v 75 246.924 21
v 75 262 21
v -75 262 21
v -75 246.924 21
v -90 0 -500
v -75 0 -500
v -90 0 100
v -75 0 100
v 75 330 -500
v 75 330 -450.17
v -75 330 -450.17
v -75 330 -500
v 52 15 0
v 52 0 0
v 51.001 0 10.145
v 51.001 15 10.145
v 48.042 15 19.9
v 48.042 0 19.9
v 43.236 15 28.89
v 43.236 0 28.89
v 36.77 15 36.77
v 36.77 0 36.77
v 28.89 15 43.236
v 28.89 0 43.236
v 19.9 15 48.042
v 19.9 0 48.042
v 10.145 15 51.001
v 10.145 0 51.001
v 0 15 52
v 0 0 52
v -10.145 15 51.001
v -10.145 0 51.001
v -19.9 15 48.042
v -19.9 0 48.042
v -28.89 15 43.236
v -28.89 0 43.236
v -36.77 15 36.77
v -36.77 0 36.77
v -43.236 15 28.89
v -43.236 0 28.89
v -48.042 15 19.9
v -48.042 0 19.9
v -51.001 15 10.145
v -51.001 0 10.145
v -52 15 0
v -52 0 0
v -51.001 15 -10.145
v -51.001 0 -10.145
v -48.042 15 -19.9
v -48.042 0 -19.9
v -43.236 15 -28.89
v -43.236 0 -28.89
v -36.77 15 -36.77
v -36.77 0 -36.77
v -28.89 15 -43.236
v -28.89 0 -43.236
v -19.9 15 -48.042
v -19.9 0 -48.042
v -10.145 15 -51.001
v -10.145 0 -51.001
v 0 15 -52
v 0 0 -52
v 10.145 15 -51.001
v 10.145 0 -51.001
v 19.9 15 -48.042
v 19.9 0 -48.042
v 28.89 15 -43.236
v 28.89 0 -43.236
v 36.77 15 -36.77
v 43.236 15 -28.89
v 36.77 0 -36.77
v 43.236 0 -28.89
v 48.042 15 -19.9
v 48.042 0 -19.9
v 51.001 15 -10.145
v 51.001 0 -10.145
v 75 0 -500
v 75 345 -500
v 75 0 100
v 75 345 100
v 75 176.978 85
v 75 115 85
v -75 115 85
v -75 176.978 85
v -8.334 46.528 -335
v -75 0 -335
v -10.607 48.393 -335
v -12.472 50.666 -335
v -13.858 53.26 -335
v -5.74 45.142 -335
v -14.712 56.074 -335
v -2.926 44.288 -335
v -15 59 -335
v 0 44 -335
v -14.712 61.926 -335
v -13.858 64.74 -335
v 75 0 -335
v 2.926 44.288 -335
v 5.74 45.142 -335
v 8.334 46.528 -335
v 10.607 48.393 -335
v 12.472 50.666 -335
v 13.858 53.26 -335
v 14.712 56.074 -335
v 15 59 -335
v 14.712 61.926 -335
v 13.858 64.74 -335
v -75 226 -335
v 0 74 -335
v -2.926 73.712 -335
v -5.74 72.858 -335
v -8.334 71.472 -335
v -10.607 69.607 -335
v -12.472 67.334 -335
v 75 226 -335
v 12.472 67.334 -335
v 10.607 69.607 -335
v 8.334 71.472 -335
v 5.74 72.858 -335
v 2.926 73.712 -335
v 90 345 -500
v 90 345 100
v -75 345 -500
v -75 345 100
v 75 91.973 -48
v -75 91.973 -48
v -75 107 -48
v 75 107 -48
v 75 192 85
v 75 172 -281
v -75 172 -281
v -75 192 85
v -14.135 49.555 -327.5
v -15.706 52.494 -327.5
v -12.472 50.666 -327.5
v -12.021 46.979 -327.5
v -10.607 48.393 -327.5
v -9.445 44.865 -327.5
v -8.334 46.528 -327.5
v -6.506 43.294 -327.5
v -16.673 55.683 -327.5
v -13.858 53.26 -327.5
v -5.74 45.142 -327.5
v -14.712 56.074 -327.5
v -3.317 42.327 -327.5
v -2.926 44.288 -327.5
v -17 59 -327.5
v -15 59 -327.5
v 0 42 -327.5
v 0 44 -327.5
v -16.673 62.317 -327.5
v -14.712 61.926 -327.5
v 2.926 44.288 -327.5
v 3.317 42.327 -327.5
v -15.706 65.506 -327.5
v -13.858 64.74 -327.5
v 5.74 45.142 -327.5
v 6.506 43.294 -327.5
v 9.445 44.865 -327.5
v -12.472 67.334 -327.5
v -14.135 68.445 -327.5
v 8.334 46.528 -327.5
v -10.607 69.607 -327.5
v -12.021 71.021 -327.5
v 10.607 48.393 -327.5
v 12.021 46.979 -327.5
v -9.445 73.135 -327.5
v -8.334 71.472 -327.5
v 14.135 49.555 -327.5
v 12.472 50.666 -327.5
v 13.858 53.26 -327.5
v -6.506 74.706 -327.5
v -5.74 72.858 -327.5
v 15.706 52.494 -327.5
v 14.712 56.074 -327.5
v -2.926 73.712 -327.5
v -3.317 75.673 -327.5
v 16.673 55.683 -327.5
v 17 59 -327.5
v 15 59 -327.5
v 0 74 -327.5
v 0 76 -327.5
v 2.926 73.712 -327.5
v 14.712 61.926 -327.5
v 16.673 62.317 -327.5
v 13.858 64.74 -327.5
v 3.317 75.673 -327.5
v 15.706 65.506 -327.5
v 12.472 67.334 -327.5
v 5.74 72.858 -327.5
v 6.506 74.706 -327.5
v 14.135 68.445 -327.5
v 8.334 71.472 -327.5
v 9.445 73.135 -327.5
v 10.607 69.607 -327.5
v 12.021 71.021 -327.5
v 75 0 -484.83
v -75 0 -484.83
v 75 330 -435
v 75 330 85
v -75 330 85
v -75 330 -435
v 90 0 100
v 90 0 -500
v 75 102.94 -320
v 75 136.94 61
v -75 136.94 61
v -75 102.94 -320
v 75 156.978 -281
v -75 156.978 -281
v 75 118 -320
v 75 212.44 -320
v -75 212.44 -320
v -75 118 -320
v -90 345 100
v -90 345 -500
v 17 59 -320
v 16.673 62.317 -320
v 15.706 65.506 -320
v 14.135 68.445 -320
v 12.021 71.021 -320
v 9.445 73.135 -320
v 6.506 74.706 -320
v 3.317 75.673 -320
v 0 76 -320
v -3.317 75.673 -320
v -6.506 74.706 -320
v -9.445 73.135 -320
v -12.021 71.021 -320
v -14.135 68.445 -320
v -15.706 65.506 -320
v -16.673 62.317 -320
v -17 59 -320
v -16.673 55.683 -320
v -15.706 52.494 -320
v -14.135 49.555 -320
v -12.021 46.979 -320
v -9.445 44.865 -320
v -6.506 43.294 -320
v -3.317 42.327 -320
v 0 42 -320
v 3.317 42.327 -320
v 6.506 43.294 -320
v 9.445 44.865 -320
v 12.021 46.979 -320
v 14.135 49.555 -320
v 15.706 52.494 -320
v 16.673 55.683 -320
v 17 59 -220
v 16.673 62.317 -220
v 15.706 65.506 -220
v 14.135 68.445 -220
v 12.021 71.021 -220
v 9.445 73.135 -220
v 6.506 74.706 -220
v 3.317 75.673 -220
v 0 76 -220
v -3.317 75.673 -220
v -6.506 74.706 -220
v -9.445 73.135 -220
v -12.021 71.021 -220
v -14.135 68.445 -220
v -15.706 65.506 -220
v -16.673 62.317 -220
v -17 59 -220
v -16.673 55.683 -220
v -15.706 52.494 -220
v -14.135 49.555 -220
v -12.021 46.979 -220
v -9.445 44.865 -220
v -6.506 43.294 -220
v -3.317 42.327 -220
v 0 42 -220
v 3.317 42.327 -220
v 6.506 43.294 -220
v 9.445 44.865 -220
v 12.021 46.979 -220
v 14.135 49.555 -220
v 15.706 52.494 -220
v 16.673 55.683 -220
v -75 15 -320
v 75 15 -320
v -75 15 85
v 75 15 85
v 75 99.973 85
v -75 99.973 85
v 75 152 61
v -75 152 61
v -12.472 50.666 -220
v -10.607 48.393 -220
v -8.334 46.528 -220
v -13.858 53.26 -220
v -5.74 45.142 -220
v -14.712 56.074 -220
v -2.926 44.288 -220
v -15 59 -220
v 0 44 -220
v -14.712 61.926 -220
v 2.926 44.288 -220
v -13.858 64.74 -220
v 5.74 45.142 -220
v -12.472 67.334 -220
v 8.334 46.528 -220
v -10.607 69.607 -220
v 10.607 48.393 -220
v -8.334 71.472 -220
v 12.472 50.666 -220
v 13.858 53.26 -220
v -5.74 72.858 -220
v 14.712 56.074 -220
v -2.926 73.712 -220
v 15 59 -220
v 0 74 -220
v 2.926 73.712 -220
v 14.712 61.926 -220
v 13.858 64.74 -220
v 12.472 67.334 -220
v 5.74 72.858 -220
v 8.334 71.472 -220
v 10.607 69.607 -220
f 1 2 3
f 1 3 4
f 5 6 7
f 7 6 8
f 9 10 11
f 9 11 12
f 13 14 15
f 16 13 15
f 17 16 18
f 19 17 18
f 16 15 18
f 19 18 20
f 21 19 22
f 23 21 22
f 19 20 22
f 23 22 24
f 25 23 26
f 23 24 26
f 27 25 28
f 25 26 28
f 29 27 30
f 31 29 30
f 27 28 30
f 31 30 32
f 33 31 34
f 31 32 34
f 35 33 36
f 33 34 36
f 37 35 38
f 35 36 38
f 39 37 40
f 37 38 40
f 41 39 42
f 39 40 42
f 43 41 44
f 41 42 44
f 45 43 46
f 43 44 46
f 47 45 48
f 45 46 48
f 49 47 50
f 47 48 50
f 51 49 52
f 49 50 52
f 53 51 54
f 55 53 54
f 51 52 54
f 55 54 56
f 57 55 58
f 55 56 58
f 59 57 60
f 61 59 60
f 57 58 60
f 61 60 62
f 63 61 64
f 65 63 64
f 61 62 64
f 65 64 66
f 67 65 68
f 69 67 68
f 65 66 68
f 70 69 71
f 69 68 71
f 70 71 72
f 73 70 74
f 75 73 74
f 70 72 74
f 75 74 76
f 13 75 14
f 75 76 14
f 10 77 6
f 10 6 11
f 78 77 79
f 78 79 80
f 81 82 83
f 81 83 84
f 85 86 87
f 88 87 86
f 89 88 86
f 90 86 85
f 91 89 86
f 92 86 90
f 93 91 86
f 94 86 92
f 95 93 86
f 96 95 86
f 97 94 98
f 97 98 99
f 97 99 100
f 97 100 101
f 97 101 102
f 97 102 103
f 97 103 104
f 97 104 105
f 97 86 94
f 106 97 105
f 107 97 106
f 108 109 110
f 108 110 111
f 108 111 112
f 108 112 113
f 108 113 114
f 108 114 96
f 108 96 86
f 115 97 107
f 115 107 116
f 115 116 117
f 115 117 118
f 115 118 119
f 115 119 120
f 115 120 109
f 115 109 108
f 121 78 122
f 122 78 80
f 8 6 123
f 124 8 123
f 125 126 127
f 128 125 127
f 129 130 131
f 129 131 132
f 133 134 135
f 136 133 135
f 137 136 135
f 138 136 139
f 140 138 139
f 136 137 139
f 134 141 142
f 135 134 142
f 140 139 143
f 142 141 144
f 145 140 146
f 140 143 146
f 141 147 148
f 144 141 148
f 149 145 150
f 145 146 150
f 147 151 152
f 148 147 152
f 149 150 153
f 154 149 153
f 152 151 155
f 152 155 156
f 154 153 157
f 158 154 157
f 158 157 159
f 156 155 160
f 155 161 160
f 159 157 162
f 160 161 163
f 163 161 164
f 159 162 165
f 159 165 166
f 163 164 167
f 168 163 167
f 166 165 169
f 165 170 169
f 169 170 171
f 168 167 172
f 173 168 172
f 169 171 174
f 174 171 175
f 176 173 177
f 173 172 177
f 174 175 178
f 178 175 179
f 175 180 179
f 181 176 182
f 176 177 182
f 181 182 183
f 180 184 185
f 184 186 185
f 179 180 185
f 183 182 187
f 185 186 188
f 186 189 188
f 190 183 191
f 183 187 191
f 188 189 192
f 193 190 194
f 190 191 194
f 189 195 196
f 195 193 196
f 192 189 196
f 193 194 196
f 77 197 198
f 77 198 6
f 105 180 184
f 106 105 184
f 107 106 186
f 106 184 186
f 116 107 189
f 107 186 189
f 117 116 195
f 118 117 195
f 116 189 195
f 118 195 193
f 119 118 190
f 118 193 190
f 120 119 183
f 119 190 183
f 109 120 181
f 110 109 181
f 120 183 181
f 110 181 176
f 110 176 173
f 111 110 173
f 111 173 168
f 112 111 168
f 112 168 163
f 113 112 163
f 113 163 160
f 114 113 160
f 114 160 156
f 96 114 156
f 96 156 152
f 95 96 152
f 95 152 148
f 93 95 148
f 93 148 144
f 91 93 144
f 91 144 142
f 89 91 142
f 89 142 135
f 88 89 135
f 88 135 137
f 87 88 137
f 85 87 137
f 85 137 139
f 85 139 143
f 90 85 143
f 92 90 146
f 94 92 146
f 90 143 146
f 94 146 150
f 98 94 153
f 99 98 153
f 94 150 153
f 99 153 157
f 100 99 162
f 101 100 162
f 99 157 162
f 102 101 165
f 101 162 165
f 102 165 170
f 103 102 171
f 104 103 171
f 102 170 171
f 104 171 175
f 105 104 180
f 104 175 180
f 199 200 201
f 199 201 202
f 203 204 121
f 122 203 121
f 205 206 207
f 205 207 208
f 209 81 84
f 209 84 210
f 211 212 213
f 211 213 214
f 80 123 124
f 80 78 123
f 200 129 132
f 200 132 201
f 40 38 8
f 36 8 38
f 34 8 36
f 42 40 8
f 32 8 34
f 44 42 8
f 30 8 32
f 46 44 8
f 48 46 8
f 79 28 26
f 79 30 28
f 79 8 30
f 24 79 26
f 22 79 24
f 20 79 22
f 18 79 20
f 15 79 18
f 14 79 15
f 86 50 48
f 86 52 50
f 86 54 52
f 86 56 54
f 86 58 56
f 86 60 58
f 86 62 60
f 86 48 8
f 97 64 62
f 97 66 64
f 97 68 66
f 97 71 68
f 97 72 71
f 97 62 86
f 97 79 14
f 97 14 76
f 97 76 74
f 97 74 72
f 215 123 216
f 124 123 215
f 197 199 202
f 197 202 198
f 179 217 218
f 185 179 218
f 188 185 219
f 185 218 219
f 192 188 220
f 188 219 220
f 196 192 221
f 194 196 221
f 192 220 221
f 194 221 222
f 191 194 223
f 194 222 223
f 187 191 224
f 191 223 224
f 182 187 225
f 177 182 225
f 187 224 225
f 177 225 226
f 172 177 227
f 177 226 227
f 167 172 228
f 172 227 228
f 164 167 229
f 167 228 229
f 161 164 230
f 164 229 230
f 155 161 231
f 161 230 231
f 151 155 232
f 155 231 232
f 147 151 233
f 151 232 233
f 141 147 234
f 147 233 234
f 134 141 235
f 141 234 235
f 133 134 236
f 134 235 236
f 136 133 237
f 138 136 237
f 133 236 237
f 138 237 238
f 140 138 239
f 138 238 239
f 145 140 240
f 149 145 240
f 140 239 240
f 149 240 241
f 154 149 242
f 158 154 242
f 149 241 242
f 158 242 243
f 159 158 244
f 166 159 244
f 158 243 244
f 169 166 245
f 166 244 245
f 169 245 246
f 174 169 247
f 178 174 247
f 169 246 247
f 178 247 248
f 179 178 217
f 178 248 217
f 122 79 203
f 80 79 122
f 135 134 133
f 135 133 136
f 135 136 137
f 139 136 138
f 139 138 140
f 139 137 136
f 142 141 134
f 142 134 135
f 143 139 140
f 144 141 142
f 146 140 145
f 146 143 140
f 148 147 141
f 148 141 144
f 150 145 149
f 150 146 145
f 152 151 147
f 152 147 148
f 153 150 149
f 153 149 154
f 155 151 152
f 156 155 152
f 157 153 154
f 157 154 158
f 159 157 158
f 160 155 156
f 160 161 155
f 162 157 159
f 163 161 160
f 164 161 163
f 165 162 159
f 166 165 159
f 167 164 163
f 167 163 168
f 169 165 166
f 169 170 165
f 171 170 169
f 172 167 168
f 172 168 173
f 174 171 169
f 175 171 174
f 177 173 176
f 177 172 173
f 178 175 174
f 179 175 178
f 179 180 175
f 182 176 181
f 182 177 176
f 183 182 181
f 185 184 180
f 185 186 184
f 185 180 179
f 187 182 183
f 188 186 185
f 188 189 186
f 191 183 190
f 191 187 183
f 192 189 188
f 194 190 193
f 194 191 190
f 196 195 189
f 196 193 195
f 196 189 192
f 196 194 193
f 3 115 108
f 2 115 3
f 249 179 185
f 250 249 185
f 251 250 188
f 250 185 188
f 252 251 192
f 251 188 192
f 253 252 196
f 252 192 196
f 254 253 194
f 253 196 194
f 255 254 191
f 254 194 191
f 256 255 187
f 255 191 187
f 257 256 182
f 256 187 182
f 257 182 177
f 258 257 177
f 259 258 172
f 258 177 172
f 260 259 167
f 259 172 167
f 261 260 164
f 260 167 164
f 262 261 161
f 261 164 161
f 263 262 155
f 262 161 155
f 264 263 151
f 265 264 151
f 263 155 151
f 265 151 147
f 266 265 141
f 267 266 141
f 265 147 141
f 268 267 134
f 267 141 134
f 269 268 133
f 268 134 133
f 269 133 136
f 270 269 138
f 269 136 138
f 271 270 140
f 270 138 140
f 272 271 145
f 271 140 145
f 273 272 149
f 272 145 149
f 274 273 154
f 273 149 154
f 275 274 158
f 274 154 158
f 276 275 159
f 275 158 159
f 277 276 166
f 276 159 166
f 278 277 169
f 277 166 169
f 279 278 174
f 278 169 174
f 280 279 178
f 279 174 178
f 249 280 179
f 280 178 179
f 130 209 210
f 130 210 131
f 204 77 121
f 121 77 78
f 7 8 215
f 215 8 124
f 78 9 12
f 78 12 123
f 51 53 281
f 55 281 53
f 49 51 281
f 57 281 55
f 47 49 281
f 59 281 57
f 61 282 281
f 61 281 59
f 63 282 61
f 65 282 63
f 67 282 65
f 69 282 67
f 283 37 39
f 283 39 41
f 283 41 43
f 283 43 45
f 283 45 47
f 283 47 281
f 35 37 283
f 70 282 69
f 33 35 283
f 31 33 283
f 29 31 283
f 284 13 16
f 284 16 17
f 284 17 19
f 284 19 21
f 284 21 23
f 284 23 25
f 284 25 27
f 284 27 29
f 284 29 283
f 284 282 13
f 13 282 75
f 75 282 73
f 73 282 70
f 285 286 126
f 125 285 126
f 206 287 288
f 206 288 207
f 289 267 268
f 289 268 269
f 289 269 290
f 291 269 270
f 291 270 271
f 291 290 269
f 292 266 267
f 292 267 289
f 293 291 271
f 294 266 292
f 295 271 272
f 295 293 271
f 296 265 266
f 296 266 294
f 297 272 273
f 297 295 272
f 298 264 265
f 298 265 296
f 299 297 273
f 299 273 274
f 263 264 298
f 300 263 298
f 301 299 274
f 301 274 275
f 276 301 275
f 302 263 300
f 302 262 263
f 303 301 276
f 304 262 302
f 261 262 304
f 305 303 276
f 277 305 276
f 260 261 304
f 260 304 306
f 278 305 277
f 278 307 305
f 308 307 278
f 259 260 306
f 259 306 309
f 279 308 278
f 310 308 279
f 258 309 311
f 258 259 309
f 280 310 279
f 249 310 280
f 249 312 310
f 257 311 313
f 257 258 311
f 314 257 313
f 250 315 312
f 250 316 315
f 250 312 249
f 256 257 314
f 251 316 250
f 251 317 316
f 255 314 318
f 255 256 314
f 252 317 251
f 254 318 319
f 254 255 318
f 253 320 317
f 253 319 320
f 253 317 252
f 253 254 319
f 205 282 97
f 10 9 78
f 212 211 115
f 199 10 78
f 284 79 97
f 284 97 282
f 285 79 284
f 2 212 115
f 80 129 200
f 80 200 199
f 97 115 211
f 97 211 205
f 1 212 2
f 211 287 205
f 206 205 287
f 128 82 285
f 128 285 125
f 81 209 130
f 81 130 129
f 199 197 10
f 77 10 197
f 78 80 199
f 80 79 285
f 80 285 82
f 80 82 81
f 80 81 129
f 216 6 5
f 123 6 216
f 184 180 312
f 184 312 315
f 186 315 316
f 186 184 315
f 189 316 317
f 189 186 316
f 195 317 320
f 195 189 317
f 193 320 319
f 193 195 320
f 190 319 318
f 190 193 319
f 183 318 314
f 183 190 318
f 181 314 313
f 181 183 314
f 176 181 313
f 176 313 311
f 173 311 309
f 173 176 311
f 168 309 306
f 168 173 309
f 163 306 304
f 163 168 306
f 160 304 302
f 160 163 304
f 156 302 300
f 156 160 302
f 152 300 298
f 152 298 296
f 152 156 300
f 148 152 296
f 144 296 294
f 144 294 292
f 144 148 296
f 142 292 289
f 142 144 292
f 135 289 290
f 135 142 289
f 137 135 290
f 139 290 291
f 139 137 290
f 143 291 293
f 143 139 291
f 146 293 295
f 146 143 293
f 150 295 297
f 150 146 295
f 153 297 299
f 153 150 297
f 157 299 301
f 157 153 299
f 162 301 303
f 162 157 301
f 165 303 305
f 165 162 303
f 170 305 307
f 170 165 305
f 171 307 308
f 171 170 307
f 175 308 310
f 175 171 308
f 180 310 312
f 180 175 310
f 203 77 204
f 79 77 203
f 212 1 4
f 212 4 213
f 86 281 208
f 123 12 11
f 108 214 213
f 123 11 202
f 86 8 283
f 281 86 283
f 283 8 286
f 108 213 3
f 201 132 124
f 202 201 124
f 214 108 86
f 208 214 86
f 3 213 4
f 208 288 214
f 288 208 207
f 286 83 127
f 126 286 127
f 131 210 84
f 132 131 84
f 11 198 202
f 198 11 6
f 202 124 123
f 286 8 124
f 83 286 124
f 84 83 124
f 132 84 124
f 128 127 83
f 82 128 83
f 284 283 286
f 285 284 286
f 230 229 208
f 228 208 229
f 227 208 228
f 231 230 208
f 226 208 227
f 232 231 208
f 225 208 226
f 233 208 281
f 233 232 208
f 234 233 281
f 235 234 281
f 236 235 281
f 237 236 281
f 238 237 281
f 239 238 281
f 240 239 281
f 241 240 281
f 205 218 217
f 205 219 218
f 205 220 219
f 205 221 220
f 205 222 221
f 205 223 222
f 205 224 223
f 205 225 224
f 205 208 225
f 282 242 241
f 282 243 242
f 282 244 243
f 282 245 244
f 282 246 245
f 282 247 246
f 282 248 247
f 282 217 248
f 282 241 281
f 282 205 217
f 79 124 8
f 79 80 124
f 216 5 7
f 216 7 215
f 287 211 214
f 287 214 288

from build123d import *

# Parameters (mm, degrees)
F1_DEPTH    = 75
F2_R        = 52
F3_DEPTH    = 15
F4_W        = 345
F4_H        = 600
F5_DEPTH    = 15
F7_R        = 15
F8_DEPTH    = 15
F7_R_2      = 17
F9_DEPTH    = 7.5
F9_FACE_R   = 17
F9_FACE_R_2 = 15
F10_DEPTH   = 107.5


with BuildPart() as f1:
    # F0 (on Right) → F1 (new body, symmetric)
    with BuildSketch(Plane.YZ):
        Polygon((0, 100), (0, -335), (226, -335), (262, 21), (246.9235, 21), (212.440354, -320), (118, -320), (152, 61), (136.940392, 61), (102.940392, -320), (15, -320), (15, 85), (99.972889, 85), (91.972889, -48), (107, -48), (115, 85), (176.977621, 85), (156.977621, -281), (172, -281), (192, 85), (330, 85), (330, -435), (0, -484.829957), (0, -500), (330, -450.170043), (330, -500), (345, -500), (345, 100), align=None)
    extrude(amount=F1_DEPTH, both=True)

    # F2 (on face) → F3 (cut, through all)
    with BuildSketch(Plane.XZ):
        Circle(F2_R)
    extrude(amount=-F3_DEPTH, mode=Mode.SUBTRACT)

    # F7 (on face) → F8 (cut, through all)
    with BuildSketch(Plane.XY.offset(-320)):
        with Locations((0, 59)):
            Circle(F7_R)
    extrude(amount=-F8_DEPTH, mode=Mode.SUBTRACT)

    # F7 (on face) → F9 (cut)
    with BuildSketch(Plane.XY.offset(-320)):
        with Locations((0, 59)):
            Circle(F7_R_2)
        with Locations((0, 59)):
            Circle(F7_R, mode=Mode.SUBTRACT)
    extrude(amount=-F9_DEPTH, mode=Mode.SUBTRACT)


with BuildPart() as f5:
    # F4 (on face) → F5 (new body)
    with BuildSketch(Plane.YZ.offset(75)):
        with Locations((172.5, -200)):
            Rectangle(F4_W, F4_H)
    extrude(amount=F5_DEPTH)


with BuildPart() as f6_1:
    # F6: instance of F5
    add(f5.part.mirror(Plane.YZ))


with BuildPart() as f10:
    # F9_face (on face) → F10 (new body)
    with BuildSketch(Plane(origin=(0, 59, -327.5), x_dir=(1, 0, 0), z_dir=(0, 0, 1))):
        Circle(F9_FACE_R)
        Circle(F9_FACE_R_2, mode=Mode.SUBTRACT)
    extrude(amount=F10_DEPTH)


solid = Compound([f1.part, f5.part, f6_1.part, f10.part])
